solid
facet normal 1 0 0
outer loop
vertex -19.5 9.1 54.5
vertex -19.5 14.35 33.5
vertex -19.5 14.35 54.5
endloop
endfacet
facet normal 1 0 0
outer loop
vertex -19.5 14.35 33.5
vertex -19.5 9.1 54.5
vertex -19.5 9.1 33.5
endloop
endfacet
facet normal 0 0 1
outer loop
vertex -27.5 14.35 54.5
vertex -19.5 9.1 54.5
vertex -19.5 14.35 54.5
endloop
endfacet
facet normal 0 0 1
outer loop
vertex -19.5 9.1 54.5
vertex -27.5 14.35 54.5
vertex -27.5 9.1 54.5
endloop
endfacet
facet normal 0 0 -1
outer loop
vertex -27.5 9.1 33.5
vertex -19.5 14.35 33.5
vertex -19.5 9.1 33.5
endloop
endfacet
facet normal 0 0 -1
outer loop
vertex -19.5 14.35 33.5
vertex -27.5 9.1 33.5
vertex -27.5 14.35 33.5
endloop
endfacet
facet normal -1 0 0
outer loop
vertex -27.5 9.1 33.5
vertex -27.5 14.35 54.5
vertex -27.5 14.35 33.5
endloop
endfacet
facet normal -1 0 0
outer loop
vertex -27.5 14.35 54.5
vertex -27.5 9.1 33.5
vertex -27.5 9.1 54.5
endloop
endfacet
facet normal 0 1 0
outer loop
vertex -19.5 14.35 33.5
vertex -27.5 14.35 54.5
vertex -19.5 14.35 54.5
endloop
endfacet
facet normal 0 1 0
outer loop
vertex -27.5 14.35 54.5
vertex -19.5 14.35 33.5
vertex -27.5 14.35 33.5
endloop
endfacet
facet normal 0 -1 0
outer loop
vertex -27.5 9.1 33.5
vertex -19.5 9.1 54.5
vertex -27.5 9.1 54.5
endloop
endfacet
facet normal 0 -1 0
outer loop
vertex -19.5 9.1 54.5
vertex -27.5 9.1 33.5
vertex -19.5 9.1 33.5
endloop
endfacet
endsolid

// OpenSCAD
// file: D:/Projects/assembly-workshop/outputs/Screen_Pi_Hue_SCR5-H8_2026-10-31/checks/geometry.scad
// SCR5-G; mm; FRONT view: X right, Z up, Y into rack. Glass/plate front Y=0.
// Measured values: work/screen-5in/Dimensions.md. Physical fit/strength UNKNOWN.
part="plate";
DROP=0.45; // coupon winner can be substituted here; all three pins use this DROP
LIP=0.8; LIP_ON=true;
LIP_EDGES=[true,true,false,false]; // left,right,bottom,top; Brian: side lips only, cosmetic
FRAME_STEP=1.5; // measured glass-edge inset to metal LCD frame, left/right only
SHIM=0; // moves rear frame seat and plate-boss mating face back
$fn=48;
GCX=33; GCZ=41.5; PW=252; PH=88.8; PT=4;
GW=120.7; GH=77.2; CLEAR=0.2; WW=GW+2*CLEAR; WH=GH+2*CLEAR;
SEAT=13.3+SHIM; FT=3;
SO=[56.45,34]; BTN_X=[45.5,35.5,25.5];
PCB_TOP=38; GAP=0.10; LEAF_T=0.8;
HOLE=[3.4,40.3,44.7];
BX=[GCX-68,GCX+68]; BZ=[10,72];
// DSI connector X extent is unmeasured: conservative assumed 8 mm inward from PCB edge.
DSI=[GCX-60.5,9.1,GCZ-38+30,8,5.25,21];
module xz(y,d){translate([0,y+d,0])rotate([90,0,0])linear_extrude(d)children();}
// rr/rack_slots copied from SCR5-F; same exact slot centres, outline shifted -0.05 Z to centre 44.4.
module rr(w,h,r){hull()for(x=[-w/2+r,w/2-r],z=[-h/2+r,h/2-r])translate([x,z])circle(r=r);}
module rack_slots(){for(x=[-118.2625,118.2625],z=[6.323,38.127,50.773,82.577])translate([x,z])hull()for(dx=[-1.5,1.5])translate([dx,0])circle(d=7);}
module cyl_y(x,y,z,d,h){translate([x,y,z])rotate([-90,0,0])cylinder(d=d,h=h);}
module window_cut(){
  xz(-0.02,4.04)translate([GCX,GCZ])square([WW,WH],center=true);
  // 0.3 x 45-degree chamfer, square corners, front only.
  translate([GCX,0.3,GCZ])rotate([90,0,0])
    linear_extrude(height=0.3,scale=[(WW+0.6)/WW,(WH+0.6)/WH])square([WW,WH],center=true);
}
module lips(){
  // Cosmetic side ledges only; rear frame/standoffs set depth and retain the screen.
  if(LIP_ON)for(i=[0:3])if(LIP_EDGES[i]){
    if(i<2)translate([GCX+(i==0?-WW/2:WW/2-LIP),2.5,GCZ-GH/2+4])cube([LIP,0.8,GH-8]);
    else translate([GCX-GW/2+4,2.5,GCZ+(i==2?-WH/2:WH/2-LIP)])cube([GW-8,0.8,LIP]);
  }
}
// Leaf/nub/bump geometry copied from SCR5-WP-A, translated to this glass centre.
module leaves(){for(x=BTN_X)translate([GCX+x-1.5,0,GCZ]){
  translate([0,0,PCB_TOP+GAP+0.9+0.1])cube([3,11.8,LEAF_T]);
  translate([0,10.2,PCB_TOP+GAP])cube([3,1.4,1.0+LEAF_T/2]);
  translate([0,10.4,PCB_TOP+GAP+1.0+LEAF_T])cube([3,1.0,0.9]);
}}
module plate(){difference(){union(){
  difference(){xz(0,PT)translate([0,PH/2])rr(PW,PH,2.5);window_cut();}
  for(x=BX,z=BZ)cyl_y(x,3.9,z,8,SEAT-3.9);
  leaves(); lips();
 }
 xz(-0.02,4.04)rack_slots();
 for(x=BTN_X)translate([GCX+x-HOLE[0]/2,-0.02,GCZ+HOLE[1]])cube([HOLE[0],SEAT+FT+0.04,HOLE[2]-HOLE[1]]);
 // Printed-in screw pilots (no heat-set OD assumption): nominal M2.5, fit UNKNOWN.
 for(x=BX,z=BZ)cyl_y(x,SEAT-6,z,2.1,6.02);
 // Rear engraving, 0.5 deep, left field.
 xz(3.5,0.52)translate([-75,40])mirror([1,0])text("SCR5-G",size=6,halign="center",font="Liberation Sans:style=Bold");
}}
module frame_blank(){
  // C-shaped perimeter; no material across the board centre / touch FPC.
  xz(SEAT,FT)translate([GCX,GCZ])difference(){square([132,76],center=true);square([116,60],center=true);}
  for(sx=[-1,1],sz=[-1,1])cyl_y(GCX+sx*SO[0],SEAT,GCZ+sz*SO[1],9,FT);
  for(x=BX,z=BZ)hull(){cyl_y(x,SEAT,z,8,FT);cyl_y(GCX+(x<GCX?-62:62),SEAT,z,8,FT);}
}
module dsi_keepout(){translate([DSI[0]-3,DSI[1]-3,DSI[2]-3])cube([DSI[3]+6,DSI[4]+6,DSI[5]+6]);}
module ribbon_route(){
  // Open left/up corridor 18 mm wide; extends past top of plate.
  translate([GCX-84,6.1,GCZ-11])cube([18,24,65]);
  translate([GCX-84,6.1,GCZ-11])cube([32,24,27]);
}
module frame(){difference(){frame_blank();dsi_keepout();ribbon_route();
 for(sx=[-1,1],sz=[-1,1])cyl_y(GCX+sx*SO[0],SEAT-0.02,GCZ+sz*SO[1],2.8,FT+0.04);
 for(x=BX,z=BZ)cyl_y(x,SEAT-0.02,z,2.8,FT+0.04);
}}
// Pin polygon/cap/notch/dot design copied unchanged from SCR5-WP-A.
module pin(d,dots){s=2*d+0.5;difference(){union(){
 translate([-1.5,0,0])rotate([90,0,90])linear_extrude(3)polygon([
 [-s-0.02,40.5],[10.2,40.5],[10.2,41.0],[11.5,41.0],[11.5+2*d,41.0-d],[15,41.0-d],[15,44.5],[-s-0.02,44.5]]);
 translate([-2.5,-s-1.5,39.6])cube([5,1.5,5.8]);
 }for(i=[0:dots-1])translate([(i-(dots-1)/2)*1.4,-s-1.5-0.01,43.5])rotate([-90,0,0])cylinder(d=0.9,h=0.4);}}
module placed_pin(i){translate([GCX+BTN_X[i],0,GCZ])pin(DROP,i+1);}
// Measured layers: cover glass 0.9 + second glass 1.6, metal frame 3.0,
// open gap 2.0, PCB 1.6. Metal frame inset ~1.5 at LEFT/RIGHT only.
// PCB centred under glass and full metal-frame top/bottom extent remain UNKNOWN.
module glass(){translate([GCX-GW/2,0,GCZ-GH/2])cube([GW,2.5,GH]);}
module lcd(){
  translate([GCX-GW/2+FRAME_STEP,2.5,GCZ-GH/2])cube([GW-2*FRAME_STEP,3.0,GH]);
}
module pcb(){translate([GCX-60.5,7.5,GCZ-38])cube([121,1.6,76]);}
module standoffs(){for(sx=[-1,1],sz=[-1,1])difference(){cyl_y(GCX+sx*SO[0],9.1,GCZ+sz*SO[1],5.5,4.2);cyl_y(GCX+sx*SO[0],9.08,GCZ+sz*SO[1],2.5,4.24);}}
module buttons(){for(x=BTN_X){
 translate([GCX+x-3.5,9.1,GCZ+38-3.4])cube([7,3.6,2.4]);
 translate([GCX+x-1.5,9.1,GCZ+37])cube([3,3.6,1]);
}}
module dsi(){translate([DSI[0],DSI[1],DSI[2]])cube([DSI[3],DSI[4],DSI[5]]);}
module touch(){translate([GCX-10,9.1,GCZ-5])cube([20,2,10]);} // lateral extent unmeasured
module dummy(){glass();lcd();pcb();standoffs();buttons();dsi();touch();}
module assembly(){color("gray")plate();color("orange")frame();for(i=[0:2])color("cyan")placed_pin(i);color([0.2,0.3,0.4,0.4])dummy();}
// main file
include <D:/Projects/assembly-workshop/outputs/Screen_Pi_Hue_SCR5-H8_2026-10-31/checks/geometry.scad>
intersection(){dsi();dsi_keepout();}
